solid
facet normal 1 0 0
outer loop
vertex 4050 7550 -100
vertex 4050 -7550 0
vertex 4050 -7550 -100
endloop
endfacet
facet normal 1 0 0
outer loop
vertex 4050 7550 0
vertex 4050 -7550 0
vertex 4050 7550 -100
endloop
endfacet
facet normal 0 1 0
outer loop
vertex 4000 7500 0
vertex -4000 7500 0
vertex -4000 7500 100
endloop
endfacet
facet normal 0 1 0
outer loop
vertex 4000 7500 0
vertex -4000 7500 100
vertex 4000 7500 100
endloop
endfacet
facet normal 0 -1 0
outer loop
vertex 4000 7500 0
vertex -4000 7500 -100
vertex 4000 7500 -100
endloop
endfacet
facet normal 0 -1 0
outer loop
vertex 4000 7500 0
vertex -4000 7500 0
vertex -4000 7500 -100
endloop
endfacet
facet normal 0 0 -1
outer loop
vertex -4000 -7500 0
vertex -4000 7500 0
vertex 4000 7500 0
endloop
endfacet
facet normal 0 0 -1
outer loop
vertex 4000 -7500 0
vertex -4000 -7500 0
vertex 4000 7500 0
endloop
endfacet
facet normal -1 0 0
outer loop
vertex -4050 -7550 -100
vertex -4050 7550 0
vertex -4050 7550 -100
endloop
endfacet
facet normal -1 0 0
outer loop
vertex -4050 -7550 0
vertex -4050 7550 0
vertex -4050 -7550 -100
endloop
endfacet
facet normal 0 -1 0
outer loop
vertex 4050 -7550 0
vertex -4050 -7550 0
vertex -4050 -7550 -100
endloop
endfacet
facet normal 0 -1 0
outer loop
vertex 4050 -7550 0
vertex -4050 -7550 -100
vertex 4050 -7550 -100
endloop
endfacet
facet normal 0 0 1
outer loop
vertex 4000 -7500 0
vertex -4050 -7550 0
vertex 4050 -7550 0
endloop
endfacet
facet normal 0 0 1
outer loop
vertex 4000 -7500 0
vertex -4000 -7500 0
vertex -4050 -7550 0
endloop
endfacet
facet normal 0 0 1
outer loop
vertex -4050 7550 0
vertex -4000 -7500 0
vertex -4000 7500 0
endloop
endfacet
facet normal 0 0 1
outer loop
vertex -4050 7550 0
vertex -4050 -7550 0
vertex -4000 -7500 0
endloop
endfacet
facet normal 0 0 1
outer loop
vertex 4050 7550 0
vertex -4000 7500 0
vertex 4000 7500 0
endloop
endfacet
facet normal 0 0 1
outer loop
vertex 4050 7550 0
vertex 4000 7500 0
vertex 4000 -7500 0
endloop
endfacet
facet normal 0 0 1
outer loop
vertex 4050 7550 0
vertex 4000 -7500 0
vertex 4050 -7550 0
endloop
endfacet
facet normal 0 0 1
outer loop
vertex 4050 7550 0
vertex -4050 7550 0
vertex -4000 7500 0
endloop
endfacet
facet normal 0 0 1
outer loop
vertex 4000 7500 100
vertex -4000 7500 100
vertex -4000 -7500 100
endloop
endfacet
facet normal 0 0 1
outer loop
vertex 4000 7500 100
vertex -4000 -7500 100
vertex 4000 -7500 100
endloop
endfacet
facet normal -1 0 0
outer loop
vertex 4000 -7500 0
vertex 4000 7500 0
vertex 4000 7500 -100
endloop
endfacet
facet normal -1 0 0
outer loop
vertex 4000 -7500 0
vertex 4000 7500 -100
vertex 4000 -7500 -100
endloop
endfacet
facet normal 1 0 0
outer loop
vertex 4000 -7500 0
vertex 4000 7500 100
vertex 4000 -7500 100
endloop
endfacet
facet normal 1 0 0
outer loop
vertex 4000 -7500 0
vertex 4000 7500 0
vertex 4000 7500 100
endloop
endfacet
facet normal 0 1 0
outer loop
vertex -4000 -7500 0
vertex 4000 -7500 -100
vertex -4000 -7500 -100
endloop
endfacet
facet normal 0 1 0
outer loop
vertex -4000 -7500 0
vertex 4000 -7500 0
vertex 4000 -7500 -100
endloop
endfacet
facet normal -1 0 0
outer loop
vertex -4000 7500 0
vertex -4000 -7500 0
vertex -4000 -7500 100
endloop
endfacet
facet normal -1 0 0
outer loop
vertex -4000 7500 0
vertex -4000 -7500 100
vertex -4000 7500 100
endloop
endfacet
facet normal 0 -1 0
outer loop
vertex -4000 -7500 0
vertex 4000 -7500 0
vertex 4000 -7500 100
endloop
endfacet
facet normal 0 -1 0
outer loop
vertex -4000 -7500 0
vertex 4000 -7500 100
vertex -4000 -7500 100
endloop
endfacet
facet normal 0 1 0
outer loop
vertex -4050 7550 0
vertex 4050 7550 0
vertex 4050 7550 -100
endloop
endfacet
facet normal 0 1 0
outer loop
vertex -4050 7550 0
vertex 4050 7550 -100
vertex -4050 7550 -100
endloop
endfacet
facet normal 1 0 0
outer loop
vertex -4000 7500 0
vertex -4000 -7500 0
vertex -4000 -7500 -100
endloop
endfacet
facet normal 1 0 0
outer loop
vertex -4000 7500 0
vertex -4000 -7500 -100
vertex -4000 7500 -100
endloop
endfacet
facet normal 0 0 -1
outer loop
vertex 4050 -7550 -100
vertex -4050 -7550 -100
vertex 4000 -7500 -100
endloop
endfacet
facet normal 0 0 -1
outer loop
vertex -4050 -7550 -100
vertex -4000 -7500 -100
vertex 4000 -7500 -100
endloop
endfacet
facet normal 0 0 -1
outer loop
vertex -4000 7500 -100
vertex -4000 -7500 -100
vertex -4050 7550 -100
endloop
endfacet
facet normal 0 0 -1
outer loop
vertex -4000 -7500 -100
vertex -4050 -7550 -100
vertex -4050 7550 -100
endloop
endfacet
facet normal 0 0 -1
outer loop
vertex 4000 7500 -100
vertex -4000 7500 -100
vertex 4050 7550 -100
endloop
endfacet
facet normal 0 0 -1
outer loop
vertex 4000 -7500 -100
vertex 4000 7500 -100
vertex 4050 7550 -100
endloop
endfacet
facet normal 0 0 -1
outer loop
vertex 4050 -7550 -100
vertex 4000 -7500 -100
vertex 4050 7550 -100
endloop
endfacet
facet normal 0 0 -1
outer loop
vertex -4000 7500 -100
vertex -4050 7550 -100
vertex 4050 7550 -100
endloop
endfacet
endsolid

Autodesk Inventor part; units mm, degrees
ref_plane "YZ Plane" through (0, 0, 0) normal (1, 0, 0) x (0, 1, 0)
ref_plane "XZ Plane" through (0, 0, 0) normal (0, 1, 0) x (-1, 0, 0)
ref_plane "XY Plane" through (0, 0, 0) normal (0, 0, 1) x (1, 0, 0)
sketch "スケッチ2" plane through (0, 0, 0) normal (0, 0, 1) x (1, 0, 0)
  line L0 (4000, -7500) -> (-4000, -7500)
  line L1 (-4000, -7500) -> (-4000, 7500)
  line L2 (-4000, 7500) -> (4000, 7500)
  line L3 (4000, 7500) -> (4000, -7500)
  line L4 (4000, -7500) -> (-4000, 7500) construction
  line L5 (-4000, -7500) -> (4000, 7500) construction
  line L6 (4050, 7550) -> (-4050, 7550)
  line L7 (-4050, 7550) -> (-4050, -7550)
  line L8 (-4050, -7550) -> (4050, -7550)
  line L9 (4050, -7550) -> (4050, 7550)
  point P0 (0, 0)
  dimension "d0" = 8000
  dimension "d1" = 15000
  dimension "d2" = 50
extrude "押し出し1" add sketch "スケッチ2" along normal blind 100 contours L0 L1 L2 L3
extrude "押し出し2" add sketch "スケッチ2" against normal blind 100 separate body
properties part number "field" material "アルミニウム 6061"
